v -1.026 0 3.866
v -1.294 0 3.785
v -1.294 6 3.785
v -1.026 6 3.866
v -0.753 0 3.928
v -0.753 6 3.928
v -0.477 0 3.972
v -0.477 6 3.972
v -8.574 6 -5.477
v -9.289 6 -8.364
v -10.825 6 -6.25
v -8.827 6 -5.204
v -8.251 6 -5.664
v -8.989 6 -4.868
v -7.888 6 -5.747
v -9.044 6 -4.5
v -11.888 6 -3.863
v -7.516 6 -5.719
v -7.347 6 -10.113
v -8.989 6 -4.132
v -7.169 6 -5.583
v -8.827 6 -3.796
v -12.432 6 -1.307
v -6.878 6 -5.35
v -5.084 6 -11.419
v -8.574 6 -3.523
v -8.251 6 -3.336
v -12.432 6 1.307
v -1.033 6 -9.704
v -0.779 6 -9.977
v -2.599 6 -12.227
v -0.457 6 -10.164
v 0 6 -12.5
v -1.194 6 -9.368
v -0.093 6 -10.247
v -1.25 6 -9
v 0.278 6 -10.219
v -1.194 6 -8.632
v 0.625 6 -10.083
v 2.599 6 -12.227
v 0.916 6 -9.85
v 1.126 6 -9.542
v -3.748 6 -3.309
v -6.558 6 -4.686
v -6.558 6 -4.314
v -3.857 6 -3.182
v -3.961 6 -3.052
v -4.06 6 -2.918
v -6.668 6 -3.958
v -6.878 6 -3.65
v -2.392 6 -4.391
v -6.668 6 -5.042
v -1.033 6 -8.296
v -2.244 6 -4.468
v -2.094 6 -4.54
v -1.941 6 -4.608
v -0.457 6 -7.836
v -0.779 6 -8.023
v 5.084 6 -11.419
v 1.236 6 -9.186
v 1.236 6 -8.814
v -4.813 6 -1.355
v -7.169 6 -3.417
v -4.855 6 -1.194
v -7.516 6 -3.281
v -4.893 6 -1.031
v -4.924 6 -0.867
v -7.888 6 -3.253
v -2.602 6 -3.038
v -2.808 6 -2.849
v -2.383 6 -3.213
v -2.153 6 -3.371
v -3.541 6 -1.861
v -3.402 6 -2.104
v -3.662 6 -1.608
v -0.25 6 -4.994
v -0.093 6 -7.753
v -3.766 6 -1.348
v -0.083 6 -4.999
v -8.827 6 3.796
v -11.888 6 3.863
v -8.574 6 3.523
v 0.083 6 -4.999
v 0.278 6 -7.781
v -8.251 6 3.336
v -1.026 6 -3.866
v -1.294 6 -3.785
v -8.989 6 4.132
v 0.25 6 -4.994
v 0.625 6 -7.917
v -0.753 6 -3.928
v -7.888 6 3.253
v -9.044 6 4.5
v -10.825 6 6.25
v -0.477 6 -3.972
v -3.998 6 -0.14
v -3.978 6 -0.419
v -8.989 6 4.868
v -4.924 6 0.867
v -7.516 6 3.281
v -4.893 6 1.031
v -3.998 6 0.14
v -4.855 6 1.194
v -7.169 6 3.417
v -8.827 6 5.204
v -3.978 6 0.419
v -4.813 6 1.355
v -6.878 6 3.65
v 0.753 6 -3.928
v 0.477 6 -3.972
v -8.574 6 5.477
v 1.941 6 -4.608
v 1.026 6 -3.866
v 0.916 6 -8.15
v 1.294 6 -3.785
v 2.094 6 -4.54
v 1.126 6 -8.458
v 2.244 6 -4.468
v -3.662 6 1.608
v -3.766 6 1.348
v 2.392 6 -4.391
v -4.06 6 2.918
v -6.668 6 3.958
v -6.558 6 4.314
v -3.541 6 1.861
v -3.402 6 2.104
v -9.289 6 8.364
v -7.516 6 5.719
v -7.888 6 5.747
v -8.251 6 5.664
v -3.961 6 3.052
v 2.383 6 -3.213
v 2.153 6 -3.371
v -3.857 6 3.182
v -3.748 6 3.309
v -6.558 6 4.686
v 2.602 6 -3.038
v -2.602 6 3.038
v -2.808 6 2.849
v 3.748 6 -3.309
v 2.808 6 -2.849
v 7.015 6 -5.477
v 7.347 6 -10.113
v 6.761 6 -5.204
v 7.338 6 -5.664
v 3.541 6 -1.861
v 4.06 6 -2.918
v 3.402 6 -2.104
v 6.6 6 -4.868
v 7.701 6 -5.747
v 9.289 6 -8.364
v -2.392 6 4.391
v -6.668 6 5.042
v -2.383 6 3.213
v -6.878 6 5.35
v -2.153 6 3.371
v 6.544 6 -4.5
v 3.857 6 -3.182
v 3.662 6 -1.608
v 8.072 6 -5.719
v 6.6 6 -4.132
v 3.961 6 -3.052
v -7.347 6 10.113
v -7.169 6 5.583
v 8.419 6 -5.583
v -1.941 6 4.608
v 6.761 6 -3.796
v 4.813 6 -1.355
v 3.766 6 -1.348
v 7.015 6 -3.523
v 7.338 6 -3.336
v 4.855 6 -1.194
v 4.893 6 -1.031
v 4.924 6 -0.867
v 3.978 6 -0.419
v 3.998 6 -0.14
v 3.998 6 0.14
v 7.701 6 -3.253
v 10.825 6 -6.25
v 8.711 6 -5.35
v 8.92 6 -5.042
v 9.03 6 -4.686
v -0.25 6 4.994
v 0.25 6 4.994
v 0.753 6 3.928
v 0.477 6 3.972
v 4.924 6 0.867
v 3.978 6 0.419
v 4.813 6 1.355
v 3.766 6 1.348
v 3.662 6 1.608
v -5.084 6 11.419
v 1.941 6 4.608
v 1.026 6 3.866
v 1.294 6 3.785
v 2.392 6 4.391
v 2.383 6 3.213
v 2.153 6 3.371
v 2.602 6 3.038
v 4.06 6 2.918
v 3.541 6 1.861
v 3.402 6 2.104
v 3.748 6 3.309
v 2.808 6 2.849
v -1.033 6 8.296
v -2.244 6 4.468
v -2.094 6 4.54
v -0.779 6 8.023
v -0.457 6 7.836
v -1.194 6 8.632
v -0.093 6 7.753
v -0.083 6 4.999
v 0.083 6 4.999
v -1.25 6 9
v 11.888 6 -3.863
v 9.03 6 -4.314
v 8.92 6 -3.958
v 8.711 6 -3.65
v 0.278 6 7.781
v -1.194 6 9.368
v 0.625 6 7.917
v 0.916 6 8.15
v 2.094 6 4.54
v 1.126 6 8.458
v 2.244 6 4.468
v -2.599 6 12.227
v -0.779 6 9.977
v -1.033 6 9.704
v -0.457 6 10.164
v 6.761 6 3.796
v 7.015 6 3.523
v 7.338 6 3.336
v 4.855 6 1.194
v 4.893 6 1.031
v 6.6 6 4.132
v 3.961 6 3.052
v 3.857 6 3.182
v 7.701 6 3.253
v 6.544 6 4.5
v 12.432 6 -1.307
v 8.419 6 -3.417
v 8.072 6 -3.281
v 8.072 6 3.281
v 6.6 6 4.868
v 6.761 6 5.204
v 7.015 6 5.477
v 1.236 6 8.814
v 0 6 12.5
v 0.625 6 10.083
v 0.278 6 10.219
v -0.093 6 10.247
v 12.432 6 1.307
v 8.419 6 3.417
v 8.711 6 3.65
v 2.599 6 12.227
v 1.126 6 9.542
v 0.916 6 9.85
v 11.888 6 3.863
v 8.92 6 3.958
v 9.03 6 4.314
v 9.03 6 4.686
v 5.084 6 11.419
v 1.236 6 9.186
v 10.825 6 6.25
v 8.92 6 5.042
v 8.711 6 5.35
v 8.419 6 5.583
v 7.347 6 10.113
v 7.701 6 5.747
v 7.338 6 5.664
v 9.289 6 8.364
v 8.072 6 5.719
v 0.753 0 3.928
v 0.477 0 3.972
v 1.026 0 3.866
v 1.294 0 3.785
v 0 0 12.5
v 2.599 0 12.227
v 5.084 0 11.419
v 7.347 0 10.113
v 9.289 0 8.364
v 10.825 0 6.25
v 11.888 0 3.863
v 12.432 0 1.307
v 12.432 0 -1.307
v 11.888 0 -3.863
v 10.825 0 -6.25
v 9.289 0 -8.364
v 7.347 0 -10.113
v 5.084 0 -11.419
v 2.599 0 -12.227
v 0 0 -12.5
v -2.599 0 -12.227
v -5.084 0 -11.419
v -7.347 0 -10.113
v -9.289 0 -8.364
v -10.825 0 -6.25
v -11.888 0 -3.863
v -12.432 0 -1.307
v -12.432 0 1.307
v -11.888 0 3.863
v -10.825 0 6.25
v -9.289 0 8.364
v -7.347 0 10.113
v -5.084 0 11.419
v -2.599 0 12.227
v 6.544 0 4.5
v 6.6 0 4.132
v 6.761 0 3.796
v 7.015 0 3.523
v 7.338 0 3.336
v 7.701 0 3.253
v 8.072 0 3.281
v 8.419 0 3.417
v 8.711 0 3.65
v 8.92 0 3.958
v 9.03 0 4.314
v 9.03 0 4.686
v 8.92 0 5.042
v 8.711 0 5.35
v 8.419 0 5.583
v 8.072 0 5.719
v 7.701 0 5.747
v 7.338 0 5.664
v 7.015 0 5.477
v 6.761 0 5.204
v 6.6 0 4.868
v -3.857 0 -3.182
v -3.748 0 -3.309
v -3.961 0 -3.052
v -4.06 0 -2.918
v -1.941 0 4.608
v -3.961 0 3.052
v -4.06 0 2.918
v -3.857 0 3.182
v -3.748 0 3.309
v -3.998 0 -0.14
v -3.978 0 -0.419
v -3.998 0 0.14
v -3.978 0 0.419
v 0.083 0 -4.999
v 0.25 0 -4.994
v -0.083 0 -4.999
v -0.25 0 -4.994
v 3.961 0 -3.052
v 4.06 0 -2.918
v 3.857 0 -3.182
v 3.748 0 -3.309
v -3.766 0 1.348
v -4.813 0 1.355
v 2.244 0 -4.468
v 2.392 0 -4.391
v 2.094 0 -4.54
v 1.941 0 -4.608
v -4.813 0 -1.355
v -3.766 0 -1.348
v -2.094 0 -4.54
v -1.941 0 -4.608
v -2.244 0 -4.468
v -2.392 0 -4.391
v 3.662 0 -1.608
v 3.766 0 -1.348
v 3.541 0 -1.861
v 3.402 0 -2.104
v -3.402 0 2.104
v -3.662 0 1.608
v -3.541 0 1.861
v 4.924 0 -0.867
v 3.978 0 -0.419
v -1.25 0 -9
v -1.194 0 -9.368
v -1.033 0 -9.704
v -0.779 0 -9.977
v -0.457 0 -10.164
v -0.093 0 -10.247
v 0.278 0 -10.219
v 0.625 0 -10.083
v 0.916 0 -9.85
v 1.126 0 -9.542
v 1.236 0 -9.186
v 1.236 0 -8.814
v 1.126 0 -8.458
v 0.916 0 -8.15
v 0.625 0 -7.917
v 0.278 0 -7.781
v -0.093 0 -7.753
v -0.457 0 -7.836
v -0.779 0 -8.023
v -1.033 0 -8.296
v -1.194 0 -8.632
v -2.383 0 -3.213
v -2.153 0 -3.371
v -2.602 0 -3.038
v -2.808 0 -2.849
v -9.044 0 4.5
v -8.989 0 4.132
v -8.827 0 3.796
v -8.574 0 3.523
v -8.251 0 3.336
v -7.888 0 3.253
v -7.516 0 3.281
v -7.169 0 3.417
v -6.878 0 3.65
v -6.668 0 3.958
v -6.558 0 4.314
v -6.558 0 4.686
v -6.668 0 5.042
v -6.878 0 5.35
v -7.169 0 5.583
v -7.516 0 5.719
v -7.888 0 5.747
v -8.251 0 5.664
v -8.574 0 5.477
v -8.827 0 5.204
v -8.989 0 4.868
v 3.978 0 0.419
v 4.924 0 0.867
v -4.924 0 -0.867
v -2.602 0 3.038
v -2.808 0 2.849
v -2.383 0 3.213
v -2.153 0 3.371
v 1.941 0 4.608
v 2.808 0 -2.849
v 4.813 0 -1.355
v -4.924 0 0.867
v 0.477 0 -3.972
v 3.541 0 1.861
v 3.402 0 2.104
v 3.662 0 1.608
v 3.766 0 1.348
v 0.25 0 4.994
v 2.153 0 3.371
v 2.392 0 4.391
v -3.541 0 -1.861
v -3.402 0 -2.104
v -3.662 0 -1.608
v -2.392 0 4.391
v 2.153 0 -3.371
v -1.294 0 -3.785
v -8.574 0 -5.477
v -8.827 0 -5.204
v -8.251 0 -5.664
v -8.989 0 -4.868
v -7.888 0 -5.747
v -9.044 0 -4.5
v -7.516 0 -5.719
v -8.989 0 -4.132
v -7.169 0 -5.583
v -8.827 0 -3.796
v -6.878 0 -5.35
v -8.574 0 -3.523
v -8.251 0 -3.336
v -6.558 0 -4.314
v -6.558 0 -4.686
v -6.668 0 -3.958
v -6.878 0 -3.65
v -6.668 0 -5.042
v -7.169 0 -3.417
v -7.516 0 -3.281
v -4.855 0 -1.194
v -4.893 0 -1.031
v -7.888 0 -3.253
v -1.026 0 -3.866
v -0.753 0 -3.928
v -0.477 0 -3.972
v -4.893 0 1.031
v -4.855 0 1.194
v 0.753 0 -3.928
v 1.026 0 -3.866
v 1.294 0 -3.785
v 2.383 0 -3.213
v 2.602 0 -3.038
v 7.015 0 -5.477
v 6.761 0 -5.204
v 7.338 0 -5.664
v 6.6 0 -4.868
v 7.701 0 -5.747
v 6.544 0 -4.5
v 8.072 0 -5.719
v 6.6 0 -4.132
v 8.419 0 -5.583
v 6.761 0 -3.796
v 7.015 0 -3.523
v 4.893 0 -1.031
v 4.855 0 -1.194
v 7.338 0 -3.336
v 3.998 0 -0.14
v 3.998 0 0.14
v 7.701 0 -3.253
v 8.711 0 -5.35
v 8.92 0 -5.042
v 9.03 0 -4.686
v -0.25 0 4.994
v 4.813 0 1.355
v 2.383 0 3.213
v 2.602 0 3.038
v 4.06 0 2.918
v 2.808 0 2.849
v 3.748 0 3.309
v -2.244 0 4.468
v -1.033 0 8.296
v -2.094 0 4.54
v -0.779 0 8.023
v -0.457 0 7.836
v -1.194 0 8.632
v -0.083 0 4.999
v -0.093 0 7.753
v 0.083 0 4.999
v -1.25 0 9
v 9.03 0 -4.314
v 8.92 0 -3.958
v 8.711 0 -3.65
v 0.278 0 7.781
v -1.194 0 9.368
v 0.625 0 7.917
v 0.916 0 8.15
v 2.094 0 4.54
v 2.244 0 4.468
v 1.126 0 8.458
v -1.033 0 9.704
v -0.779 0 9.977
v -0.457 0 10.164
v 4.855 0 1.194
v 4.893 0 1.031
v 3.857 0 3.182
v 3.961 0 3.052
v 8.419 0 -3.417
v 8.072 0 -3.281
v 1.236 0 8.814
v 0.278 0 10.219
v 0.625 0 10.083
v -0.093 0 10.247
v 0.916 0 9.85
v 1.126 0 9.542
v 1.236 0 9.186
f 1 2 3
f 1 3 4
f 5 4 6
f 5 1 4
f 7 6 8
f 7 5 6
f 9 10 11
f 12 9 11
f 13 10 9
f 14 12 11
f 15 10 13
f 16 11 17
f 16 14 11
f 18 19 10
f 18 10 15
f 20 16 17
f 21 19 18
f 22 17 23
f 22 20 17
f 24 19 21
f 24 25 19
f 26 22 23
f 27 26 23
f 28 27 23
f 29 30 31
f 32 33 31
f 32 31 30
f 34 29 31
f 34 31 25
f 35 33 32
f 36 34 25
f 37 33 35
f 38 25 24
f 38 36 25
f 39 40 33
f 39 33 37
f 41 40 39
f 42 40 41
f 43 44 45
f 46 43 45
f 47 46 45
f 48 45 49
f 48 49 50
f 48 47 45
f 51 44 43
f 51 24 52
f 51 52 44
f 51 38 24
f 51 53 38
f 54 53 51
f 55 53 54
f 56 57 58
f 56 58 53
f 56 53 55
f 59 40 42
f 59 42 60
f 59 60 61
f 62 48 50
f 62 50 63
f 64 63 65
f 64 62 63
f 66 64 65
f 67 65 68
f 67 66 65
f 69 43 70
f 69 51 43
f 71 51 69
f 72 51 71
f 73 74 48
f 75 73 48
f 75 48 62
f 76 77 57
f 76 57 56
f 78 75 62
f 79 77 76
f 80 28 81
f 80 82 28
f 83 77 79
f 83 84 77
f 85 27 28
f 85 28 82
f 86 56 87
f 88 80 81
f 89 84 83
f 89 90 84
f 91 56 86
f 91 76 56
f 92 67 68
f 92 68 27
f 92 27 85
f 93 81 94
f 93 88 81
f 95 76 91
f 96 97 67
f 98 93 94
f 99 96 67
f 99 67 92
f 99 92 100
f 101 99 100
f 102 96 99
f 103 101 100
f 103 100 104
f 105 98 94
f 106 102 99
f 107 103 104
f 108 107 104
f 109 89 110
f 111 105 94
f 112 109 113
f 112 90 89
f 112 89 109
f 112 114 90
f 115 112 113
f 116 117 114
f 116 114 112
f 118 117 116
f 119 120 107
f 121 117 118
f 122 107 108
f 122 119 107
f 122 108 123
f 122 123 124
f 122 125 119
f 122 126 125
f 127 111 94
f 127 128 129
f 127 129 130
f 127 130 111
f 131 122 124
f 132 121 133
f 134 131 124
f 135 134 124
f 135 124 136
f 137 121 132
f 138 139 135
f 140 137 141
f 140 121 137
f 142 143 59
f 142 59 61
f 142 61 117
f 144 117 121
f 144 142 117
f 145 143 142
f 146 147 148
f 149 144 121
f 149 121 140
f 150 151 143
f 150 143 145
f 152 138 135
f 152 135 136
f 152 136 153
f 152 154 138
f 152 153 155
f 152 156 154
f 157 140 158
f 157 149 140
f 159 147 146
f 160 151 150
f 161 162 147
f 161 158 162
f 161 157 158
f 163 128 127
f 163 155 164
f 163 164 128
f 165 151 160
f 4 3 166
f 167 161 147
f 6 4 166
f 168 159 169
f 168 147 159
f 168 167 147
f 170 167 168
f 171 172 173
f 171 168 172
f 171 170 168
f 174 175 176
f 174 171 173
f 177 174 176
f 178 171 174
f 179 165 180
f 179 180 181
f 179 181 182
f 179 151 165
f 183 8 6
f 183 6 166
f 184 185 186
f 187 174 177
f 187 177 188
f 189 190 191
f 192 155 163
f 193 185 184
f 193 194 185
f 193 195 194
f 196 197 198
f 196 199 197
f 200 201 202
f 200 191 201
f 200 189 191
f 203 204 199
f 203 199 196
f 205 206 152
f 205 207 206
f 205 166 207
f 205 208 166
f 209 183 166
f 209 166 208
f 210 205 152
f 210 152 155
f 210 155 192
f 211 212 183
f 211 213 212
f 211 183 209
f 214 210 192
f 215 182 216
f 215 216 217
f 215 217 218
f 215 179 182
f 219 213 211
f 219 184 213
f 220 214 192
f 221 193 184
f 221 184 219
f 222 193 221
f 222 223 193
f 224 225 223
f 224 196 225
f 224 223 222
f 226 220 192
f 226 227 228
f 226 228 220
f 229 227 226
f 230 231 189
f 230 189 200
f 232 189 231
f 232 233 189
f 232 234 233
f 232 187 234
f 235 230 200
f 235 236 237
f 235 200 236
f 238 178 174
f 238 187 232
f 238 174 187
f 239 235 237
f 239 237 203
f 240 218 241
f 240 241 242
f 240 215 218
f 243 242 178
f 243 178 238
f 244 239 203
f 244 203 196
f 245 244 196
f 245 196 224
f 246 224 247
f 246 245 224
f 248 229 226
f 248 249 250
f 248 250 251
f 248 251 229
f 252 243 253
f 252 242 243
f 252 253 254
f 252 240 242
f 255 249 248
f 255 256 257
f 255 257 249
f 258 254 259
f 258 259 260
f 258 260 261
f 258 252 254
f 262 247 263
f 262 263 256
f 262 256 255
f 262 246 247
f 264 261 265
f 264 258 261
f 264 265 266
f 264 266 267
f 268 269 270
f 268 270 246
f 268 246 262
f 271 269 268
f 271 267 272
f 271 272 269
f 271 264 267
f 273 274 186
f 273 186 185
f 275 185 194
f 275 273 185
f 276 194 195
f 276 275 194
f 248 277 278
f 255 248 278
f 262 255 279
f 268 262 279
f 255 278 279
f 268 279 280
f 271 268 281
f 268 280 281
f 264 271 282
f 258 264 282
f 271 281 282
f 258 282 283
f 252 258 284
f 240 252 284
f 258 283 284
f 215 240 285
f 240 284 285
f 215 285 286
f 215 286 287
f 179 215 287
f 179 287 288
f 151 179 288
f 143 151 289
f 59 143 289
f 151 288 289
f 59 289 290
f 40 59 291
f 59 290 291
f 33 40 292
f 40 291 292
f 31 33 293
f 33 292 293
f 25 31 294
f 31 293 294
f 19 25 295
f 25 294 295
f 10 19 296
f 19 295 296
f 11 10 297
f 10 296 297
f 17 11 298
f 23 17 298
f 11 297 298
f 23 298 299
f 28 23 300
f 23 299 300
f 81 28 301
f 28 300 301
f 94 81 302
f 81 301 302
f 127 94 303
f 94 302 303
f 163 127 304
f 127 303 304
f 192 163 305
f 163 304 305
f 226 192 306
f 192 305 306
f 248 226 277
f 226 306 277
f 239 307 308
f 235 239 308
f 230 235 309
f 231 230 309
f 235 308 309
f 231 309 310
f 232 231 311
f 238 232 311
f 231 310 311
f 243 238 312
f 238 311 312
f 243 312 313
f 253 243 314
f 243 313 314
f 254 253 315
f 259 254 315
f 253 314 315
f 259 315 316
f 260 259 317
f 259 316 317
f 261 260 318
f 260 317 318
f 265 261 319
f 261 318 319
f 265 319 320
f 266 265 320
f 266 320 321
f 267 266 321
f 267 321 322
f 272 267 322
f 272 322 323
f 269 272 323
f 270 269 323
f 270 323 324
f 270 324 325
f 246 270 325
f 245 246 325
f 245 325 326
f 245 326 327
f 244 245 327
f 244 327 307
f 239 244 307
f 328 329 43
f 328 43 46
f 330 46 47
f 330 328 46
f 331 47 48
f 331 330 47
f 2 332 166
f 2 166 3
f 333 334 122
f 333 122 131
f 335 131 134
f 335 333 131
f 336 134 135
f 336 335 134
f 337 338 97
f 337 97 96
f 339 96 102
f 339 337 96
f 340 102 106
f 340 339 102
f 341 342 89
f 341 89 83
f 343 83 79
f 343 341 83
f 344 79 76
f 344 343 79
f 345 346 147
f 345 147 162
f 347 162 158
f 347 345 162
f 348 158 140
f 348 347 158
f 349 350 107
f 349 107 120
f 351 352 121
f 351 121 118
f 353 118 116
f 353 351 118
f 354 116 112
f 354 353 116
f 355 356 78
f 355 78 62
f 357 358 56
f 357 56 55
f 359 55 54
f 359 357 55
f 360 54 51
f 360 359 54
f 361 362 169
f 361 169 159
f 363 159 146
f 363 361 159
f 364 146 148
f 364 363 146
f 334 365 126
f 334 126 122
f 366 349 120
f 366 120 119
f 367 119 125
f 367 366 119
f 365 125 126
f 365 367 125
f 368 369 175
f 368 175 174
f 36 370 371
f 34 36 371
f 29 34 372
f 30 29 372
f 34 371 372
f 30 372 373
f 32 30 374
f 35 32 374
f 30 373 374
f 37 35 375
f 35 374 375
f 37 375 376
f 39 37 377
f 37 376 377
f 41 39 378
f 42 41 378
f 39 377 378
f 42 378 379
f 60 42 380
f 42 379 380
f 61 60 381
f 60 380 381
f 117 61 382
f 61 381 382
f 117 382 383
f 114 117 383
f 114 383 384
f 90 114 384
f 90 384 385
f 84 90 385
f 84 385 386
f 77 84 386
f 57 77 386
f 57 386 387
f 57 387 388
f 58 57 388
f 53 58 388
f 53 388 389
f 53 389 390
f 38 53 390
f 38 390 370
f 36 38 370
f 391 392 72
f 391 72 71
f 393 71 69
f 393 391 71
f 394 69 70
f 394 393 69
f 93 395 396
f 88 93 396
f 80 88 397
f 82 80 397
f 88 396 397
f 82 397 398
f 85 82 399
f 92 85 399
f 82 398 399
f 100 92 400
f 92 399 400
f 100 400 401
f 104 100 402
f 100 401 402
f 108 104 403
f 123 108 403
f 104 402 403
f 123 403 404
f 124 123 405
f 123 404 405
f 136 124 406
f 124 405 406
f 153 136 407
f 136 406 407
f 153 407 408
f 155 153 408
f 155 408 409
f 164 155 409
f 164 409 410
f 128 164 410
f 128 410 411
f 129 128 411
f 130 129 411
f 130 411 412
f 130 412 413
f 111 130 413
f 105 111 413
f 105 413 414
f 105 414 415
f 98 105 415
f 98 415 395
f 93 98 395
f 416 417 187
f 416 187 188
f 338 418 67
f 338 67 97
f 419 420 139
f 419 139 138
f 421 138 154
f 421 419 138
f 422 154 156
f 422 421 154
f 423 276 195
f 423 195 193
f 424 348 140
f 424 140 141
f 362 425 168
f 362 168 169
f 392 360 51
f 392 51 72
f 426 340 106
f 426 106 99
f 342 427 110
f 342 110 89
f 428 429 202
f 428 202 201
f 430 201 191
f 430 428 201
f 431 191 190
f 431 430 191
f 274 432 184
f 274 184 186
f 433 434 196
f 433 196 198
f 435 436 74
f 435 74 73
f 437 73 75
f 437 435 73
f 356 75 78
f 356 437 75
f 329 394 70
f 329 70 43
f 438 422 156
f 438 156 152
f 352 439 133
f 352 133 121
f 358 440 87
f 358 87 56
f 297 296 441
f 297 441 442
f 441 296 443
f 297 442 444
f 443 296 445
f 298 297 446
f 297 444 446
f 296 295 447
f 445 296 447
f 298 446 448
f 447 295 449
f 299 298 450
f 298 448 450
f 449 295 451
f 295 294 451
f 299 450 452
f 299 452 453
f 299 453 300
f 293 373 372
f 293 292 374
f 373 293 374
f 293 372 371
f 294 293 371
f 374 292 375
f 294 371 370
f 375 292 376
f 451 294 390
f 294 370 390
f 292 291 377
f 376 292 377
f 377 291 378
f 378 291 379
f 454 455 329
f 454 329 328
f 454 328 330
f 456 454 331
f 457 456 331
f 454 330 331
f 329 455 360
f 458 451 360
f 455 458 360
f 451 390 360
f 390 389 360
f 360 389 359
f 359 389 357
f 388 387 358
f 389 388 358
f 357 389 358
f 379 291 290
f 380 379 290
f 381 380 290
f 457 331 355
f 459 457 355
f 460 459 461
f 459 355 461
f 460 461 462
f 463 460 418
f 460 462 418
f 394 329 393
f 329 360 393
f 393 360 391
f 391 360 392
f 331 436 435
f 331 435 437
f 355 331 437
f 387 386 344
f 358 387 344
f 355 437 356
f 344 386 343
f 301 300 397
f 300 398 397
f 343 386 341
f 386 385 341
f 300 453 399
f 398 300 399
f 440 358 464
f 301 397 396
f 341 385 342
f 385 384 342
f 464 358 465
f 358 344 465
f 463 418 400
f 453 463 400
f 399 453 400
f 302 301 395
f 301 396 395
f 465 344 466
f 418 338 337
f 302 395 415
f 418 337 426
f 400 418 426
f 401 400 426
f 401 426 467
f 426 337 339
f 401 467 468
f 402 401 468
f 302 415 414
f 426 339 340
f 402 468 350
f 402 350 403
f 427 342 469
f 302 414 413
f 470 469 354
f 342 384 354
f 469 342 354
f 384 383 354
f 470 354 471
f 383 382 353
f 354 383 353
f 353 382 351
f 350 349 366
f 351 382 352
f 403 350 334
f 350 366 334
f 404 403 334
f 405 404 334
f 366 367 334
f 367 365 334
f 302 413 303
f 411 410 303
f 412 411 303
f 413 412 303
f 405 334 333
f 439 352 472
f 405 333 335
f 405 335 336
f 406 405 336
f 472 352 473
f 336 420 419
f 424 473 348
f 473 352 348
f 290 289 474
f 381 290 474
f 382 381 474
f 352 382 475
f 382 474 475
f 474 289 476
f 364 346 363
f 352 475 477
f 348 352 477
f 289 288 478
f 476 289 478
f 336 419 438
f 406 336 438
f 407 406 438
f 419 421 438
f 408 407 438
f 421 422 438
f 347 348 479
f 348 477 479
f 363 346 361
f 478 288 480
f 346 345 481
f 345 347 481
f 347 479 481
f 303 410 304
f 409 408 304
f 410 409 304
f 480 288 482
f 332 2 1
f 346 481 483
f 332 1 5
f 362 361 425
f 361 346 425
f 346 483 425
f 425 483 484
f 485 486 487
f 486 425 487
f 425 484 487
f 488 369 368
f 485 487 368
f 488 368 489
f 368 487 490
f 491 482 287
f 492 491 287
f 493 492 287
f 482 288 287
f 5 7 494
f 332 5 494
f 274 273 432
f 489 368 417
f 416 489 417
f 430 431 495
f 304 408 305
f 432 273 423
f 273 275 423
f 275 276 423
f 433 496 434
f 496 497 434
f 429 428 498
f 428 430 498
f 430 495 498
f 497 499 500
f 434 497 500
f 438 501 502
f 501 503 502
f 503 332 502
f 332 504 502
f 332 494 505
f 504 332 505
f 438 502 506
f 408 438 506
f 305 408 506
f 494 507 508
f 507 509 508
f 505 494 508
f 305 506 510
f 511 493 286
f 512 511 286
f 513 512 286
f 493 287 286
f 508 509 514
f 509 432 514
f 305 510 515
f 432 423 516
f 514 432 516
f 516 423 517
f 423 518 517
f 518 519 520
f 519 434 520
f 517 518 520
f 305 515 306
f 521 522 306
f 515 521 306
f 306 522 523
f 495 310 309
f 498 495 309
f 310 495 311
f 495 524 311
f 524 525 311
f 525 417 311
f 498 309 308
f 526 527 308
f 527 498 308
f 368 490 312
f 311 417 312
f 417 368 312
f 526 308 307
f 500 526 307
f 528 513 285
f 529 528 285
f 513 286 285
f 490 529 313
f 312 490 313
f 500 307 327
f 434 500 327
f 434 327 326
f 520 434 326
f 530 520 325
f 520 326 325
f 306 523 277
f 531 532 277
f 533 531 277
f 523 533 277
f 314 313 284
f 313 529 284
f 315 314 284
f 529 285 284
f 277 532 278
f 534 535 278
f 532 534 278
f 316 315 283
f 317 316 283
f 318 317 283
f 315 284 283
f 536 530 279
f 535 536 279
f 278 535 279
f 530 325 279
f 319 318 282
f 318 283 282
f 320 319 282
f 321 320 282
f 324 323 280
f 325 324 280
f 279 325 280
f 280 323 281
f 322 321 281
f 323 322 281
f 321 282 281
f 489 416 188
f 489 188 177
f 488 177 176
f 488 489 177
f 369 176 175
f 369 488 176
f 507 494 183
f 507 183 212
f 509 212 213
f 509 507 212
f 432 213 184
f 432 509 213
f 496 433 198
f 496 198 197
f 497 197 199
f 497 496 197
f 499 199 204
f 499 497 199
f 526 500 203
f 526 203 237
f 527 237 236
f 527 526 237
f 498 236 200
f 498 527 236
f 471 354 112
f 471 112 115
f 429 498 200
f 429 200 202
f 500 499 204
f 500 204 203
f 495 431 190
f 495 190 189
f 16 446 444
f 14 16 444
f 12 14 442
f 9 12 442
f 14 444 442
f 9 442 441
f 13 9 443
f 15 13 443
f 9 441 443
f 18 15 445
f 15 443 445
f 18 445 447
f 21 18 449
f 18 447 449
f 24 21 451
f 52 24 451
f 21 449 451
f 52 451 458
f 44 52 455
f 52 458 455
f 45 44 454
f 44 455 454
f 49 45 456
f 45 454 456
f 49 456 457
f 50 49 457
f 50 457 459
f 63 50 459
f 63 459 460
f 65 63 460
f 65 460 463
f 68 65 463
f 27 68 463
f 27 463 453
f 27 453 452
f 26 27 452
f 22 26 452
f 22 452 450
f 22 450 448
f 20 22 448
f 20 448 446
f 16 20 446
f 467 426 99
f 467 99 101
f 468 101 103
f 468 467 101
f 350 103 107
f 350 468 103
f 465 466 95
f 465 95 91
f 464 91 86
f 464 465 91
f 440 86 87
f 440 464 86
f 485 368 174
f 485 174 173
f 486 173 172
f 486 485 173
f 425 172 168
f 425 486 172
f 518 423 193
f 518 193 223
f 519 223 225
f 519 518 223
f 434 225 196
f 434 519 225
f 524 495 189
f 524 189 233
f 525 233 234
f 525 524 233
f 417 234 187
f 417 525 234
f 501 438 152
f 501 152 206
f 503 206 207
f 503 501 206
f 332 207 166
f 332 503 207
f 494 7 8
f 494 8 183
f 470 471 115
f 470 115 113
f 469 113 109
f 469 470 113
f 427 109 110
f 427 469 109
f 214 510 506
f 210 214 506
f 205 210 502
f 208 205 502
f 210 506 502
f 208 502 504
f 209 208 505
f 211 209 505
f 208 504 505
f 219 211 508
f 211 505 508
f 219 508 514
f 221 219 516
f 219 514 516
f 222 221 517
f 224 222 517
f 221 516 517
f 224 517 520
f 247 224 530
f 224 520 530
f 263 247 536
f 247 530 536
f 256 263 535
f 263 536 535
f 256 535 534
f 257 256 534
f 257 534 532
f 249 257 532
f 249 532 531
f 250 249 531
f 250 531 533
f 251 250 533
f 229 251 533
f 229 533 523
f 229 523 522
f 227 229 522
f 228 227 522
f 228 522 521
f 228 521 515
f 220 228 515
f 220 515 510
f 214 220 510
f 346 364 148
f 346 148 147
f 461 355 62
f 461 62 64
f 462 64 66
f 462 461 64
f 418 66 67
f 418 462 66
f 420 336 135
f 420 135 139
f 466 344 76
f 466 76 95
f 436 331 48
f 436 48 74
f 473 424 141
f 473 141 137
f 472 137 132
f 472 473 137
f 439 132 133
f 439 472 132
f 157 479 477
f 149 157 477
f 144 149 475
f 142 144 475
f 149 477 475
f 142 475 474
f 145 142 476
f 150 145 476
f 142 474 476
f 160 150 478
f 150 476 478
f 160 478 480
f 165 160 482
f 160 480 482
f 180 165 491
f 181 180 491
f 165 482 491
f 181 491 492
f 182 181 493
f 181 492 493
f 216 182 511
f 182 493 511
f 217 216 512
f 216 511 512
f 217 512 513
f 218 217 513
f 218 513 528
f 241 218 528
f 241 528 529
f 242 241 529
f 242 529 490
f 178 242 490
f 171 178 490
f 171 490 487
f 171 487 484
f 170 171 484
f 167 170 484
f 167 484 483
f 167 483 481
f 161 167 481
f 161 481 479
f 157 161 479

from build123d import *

# Parameters (mm, degrees)
SKETCH1_R           = 12.5
BOSS_EXTRUDE1_DEPTH = 6
M3_TAPPED_HOLE1_D   = 2.5


with BuildPart() as part:
    # Sketch1 → Boss-Extrude1 (new body)
    with BuildSketch(Plane(origin=(0, 0, 0), x_dir=(1, 0, 0), z_dir=(0, 1, 0))):
        with Locations(Location((0, 0, 0), (0, 0, 270))):
            Circle(SKETCH1_R)
        with BuildLine():
            Line((-0.25, 4.993746089), (-0.476626074, 3.971501931))
            ThreePointArc((-0.476626074, 3.971501931), (-0.890083736, 3.899711649), (-1.293744854, 3.784999901))
            Line((-1.293744854, 3.784999901), (-1.941463008, 4.607680695))
            ThreePointArc((-1.941463008, 4.607680695), (-2.169418696, 4.50484434), (-2.391947442, 4.390738825))
            Line((-2.391947442, 4.390738825), (-2.152595362, 3.371399295))
            ThreePointArc((-2.152595362, 3.371399295), (-2.493959207, 3.12732593), (-2.807873746, 2.848832222))
            Line((-2.807873746, 2.848832222), (-3.748395457, 3.30900763))
            ThreePointArc((-3.748395457, 3.30900763), (-3.909157412, 3.117449009), (-4.060140358, 2.918091889))
            Line((-4.060140358, 2.918091889), (-3.402216738, 2.103549682))
            ThreePointArc((-3.402216738, 2.103549682), (-3.603875472, 1.735534956), (-3.765868806, 1.348418382))
            Line((-3.765868806, 1.348418382), (-4.812912215, 1.354945022))
            ThreePointArc((-4.812912215, 1.354945022), (-4.874639561, 1.11260467), (-4.924172682, 0.867481066))
            Line((-4.924172682, 0.867481066), (-3.977987365, 0.419066256))
            ThreePointArc((-3.977987365, 0.419066256), (-4, 0), (-3.977987365, -0.419066256))
            Line((-3.977987365, -0.419066256), (-4.924172682, -0.867481066))
            ThreePointArc((-4.924172682, -0.867481066), (-4.874639561, -1.11260467), (-4.812912215, -1.354945022))
            Line((-4.812912215, -1.354945022), (-3.765868806, -1.348418382))
            ThreePointArc((-3.765868806, -1.348418382), (-3.603875472, -1.735534956), (-3.402216738, -2.103549682))
            Line((-3.402216738, -2.103549682), (-4.060140358, -2.918091889))
            ThreePointArc((-4.060140358, -2.918091889), (-3.909157412, -3.117449009), (-3.748395457, -3.30900763))
            Line((-3.748395457, -3.30900763), (-2.807873746, -2.848832222))
            ThreePointArc((-2.807873746, -2.848832222), (-2.493959207, -3.12732593), (-2.152595362, -3.371399295))
            Line((-2.152595362, -3.371399295), (-2.391947442, -4.390738825))
            ThreePointArc((-2.391947442, -4.390738825), (-2.169418696, -4.50484434), (-1.941463008, -4.607680695))
            Line((-1.941463008, -4.607680695), (-1.293744854, -3.784999901))
            ThreePointArc((-1.293744854, -3.784999901), (-0.890083736, -3.899711649), (-0.476626074, -3.971501931))
            Line((-0.476626074, -3.971501931), (-0.25, -4.993746089))
            ThreePointArc((-0.25, -4.993746089), (0, -5), (0.25, -4.993746089))
            Line((0.25, -4.993746089), (0.476626074, -3.971501931))
            ThreePointArc((0.476626074, -3.971501931), (0.890083736, -3.899711649), (1.293744854, -3.784999901))
            Line((1.293744854, -3.784999901), (1.941463008, -4.607680695))
            ThreePointArc((1.941463008, -4.607680695), (2.169418696, -4.50484434), (2.391947442, -4.390738825))
            Line((2.391947442, -4.390738825), (2.152595362, -3.371399295))
            ThreePointArc((2.152595362, -3.371399295), (2.493959207, -3.12732593), (2.807873746, -2.848832222))
            Line((2.807873746, -2.848832222), (3.748395457, -3.30900763))
            ThreePointArc((3.748395457, -3.30900763), (3.909157412, -3.117449009), (4.060140358, -2.918091889))
            Line((4.060140358, -2.918091889), (3.402216738, -2.103549682))
            ThreePointArc((3.402216738, -2.103549682), (3.603875472, -1.735534956), (3.765868806, -1.348418382))
            Line((3.765868806, -1.348418382), (4.812912215, -1.354945022))
            ThreePointArc((4.812912215, -1.354945022), (4.874639561, -1.11260467), (4.924172682, -0.867481066))
            Line((4.924172682, -0.867481066), (3.977987365, -0.419066256))
            ThreePointArc((3.977987365, -0.419066256), (4, 0), (3.977987365, 0.419066256))
            Line((3.977987365, 0.419066256), (4.924172682, 0.867481066))
            ThreePointArc((4.924172682, 0.867481066), (4.874639561, 1.11260467), (4.812912215, 1.354945022))
            Line((4.812912215, 1.354945022), (3.765868806, 1.348418382))
            ThreePointArc((3.765868806, 1.348418382), (3.603875472, 1.735534956), (3.402216738, 2.103549682))
            Line((3.402216738, 2.103549682), (4.060140358, 2.918091889))
            ThreePointArc((4.060140358, 2.918091889), (3.909157412, 3.117449009), (3.748395457, 3.30900763))
            Line((3.748395457, 3.30900763), (2.807873746, 2.848832222))
            ThreePointArc((2.807873746, 2.848832222), (2.493959207, 3.12732593), (2.152595362, 3.371399295))
            Line((2.152595362, 3.371399295), (2.391947442, 4.390738825))
            ThreePointArc((2.391947442, 4.390738825), (2.169418696, 4.50484434), (1.941463008, 4.607680695))
            Line((1.941463008, 4.607680695), (1.293744854, 3.784999901))
            ThreePointArc((1.293744854, 3.784999901), (0.890083736, 3.899711649), (0.476626074, 3.971501931))
            Line((0.476626074, 3.971501931), (0.25, 4.993746089))
            ThreePointArc((0.25, 4.993746089), (0, 5), (-0.25, 4.993746089))
        make_face(mode=Mode.SUBTRACT)
    extrude(amount=BOSS_EXTRUDE1_DEPTH)

    # M3 Tapped Hole1 (through all)
    with Locations(Plane(origin=(0, 6, 0), x_dir=(1, 0, 0), z_dir=(0, 1, 0))):
        with Locations((0, 9), (7.794228634, 4.5), (7.794228634, -4.5), (0, -9), (-7.794228634, -4.5), (-7.794228634, 4.5)):
            Hole(M3_TAPPED_HOLE1_D / 2)


solid = part.part
